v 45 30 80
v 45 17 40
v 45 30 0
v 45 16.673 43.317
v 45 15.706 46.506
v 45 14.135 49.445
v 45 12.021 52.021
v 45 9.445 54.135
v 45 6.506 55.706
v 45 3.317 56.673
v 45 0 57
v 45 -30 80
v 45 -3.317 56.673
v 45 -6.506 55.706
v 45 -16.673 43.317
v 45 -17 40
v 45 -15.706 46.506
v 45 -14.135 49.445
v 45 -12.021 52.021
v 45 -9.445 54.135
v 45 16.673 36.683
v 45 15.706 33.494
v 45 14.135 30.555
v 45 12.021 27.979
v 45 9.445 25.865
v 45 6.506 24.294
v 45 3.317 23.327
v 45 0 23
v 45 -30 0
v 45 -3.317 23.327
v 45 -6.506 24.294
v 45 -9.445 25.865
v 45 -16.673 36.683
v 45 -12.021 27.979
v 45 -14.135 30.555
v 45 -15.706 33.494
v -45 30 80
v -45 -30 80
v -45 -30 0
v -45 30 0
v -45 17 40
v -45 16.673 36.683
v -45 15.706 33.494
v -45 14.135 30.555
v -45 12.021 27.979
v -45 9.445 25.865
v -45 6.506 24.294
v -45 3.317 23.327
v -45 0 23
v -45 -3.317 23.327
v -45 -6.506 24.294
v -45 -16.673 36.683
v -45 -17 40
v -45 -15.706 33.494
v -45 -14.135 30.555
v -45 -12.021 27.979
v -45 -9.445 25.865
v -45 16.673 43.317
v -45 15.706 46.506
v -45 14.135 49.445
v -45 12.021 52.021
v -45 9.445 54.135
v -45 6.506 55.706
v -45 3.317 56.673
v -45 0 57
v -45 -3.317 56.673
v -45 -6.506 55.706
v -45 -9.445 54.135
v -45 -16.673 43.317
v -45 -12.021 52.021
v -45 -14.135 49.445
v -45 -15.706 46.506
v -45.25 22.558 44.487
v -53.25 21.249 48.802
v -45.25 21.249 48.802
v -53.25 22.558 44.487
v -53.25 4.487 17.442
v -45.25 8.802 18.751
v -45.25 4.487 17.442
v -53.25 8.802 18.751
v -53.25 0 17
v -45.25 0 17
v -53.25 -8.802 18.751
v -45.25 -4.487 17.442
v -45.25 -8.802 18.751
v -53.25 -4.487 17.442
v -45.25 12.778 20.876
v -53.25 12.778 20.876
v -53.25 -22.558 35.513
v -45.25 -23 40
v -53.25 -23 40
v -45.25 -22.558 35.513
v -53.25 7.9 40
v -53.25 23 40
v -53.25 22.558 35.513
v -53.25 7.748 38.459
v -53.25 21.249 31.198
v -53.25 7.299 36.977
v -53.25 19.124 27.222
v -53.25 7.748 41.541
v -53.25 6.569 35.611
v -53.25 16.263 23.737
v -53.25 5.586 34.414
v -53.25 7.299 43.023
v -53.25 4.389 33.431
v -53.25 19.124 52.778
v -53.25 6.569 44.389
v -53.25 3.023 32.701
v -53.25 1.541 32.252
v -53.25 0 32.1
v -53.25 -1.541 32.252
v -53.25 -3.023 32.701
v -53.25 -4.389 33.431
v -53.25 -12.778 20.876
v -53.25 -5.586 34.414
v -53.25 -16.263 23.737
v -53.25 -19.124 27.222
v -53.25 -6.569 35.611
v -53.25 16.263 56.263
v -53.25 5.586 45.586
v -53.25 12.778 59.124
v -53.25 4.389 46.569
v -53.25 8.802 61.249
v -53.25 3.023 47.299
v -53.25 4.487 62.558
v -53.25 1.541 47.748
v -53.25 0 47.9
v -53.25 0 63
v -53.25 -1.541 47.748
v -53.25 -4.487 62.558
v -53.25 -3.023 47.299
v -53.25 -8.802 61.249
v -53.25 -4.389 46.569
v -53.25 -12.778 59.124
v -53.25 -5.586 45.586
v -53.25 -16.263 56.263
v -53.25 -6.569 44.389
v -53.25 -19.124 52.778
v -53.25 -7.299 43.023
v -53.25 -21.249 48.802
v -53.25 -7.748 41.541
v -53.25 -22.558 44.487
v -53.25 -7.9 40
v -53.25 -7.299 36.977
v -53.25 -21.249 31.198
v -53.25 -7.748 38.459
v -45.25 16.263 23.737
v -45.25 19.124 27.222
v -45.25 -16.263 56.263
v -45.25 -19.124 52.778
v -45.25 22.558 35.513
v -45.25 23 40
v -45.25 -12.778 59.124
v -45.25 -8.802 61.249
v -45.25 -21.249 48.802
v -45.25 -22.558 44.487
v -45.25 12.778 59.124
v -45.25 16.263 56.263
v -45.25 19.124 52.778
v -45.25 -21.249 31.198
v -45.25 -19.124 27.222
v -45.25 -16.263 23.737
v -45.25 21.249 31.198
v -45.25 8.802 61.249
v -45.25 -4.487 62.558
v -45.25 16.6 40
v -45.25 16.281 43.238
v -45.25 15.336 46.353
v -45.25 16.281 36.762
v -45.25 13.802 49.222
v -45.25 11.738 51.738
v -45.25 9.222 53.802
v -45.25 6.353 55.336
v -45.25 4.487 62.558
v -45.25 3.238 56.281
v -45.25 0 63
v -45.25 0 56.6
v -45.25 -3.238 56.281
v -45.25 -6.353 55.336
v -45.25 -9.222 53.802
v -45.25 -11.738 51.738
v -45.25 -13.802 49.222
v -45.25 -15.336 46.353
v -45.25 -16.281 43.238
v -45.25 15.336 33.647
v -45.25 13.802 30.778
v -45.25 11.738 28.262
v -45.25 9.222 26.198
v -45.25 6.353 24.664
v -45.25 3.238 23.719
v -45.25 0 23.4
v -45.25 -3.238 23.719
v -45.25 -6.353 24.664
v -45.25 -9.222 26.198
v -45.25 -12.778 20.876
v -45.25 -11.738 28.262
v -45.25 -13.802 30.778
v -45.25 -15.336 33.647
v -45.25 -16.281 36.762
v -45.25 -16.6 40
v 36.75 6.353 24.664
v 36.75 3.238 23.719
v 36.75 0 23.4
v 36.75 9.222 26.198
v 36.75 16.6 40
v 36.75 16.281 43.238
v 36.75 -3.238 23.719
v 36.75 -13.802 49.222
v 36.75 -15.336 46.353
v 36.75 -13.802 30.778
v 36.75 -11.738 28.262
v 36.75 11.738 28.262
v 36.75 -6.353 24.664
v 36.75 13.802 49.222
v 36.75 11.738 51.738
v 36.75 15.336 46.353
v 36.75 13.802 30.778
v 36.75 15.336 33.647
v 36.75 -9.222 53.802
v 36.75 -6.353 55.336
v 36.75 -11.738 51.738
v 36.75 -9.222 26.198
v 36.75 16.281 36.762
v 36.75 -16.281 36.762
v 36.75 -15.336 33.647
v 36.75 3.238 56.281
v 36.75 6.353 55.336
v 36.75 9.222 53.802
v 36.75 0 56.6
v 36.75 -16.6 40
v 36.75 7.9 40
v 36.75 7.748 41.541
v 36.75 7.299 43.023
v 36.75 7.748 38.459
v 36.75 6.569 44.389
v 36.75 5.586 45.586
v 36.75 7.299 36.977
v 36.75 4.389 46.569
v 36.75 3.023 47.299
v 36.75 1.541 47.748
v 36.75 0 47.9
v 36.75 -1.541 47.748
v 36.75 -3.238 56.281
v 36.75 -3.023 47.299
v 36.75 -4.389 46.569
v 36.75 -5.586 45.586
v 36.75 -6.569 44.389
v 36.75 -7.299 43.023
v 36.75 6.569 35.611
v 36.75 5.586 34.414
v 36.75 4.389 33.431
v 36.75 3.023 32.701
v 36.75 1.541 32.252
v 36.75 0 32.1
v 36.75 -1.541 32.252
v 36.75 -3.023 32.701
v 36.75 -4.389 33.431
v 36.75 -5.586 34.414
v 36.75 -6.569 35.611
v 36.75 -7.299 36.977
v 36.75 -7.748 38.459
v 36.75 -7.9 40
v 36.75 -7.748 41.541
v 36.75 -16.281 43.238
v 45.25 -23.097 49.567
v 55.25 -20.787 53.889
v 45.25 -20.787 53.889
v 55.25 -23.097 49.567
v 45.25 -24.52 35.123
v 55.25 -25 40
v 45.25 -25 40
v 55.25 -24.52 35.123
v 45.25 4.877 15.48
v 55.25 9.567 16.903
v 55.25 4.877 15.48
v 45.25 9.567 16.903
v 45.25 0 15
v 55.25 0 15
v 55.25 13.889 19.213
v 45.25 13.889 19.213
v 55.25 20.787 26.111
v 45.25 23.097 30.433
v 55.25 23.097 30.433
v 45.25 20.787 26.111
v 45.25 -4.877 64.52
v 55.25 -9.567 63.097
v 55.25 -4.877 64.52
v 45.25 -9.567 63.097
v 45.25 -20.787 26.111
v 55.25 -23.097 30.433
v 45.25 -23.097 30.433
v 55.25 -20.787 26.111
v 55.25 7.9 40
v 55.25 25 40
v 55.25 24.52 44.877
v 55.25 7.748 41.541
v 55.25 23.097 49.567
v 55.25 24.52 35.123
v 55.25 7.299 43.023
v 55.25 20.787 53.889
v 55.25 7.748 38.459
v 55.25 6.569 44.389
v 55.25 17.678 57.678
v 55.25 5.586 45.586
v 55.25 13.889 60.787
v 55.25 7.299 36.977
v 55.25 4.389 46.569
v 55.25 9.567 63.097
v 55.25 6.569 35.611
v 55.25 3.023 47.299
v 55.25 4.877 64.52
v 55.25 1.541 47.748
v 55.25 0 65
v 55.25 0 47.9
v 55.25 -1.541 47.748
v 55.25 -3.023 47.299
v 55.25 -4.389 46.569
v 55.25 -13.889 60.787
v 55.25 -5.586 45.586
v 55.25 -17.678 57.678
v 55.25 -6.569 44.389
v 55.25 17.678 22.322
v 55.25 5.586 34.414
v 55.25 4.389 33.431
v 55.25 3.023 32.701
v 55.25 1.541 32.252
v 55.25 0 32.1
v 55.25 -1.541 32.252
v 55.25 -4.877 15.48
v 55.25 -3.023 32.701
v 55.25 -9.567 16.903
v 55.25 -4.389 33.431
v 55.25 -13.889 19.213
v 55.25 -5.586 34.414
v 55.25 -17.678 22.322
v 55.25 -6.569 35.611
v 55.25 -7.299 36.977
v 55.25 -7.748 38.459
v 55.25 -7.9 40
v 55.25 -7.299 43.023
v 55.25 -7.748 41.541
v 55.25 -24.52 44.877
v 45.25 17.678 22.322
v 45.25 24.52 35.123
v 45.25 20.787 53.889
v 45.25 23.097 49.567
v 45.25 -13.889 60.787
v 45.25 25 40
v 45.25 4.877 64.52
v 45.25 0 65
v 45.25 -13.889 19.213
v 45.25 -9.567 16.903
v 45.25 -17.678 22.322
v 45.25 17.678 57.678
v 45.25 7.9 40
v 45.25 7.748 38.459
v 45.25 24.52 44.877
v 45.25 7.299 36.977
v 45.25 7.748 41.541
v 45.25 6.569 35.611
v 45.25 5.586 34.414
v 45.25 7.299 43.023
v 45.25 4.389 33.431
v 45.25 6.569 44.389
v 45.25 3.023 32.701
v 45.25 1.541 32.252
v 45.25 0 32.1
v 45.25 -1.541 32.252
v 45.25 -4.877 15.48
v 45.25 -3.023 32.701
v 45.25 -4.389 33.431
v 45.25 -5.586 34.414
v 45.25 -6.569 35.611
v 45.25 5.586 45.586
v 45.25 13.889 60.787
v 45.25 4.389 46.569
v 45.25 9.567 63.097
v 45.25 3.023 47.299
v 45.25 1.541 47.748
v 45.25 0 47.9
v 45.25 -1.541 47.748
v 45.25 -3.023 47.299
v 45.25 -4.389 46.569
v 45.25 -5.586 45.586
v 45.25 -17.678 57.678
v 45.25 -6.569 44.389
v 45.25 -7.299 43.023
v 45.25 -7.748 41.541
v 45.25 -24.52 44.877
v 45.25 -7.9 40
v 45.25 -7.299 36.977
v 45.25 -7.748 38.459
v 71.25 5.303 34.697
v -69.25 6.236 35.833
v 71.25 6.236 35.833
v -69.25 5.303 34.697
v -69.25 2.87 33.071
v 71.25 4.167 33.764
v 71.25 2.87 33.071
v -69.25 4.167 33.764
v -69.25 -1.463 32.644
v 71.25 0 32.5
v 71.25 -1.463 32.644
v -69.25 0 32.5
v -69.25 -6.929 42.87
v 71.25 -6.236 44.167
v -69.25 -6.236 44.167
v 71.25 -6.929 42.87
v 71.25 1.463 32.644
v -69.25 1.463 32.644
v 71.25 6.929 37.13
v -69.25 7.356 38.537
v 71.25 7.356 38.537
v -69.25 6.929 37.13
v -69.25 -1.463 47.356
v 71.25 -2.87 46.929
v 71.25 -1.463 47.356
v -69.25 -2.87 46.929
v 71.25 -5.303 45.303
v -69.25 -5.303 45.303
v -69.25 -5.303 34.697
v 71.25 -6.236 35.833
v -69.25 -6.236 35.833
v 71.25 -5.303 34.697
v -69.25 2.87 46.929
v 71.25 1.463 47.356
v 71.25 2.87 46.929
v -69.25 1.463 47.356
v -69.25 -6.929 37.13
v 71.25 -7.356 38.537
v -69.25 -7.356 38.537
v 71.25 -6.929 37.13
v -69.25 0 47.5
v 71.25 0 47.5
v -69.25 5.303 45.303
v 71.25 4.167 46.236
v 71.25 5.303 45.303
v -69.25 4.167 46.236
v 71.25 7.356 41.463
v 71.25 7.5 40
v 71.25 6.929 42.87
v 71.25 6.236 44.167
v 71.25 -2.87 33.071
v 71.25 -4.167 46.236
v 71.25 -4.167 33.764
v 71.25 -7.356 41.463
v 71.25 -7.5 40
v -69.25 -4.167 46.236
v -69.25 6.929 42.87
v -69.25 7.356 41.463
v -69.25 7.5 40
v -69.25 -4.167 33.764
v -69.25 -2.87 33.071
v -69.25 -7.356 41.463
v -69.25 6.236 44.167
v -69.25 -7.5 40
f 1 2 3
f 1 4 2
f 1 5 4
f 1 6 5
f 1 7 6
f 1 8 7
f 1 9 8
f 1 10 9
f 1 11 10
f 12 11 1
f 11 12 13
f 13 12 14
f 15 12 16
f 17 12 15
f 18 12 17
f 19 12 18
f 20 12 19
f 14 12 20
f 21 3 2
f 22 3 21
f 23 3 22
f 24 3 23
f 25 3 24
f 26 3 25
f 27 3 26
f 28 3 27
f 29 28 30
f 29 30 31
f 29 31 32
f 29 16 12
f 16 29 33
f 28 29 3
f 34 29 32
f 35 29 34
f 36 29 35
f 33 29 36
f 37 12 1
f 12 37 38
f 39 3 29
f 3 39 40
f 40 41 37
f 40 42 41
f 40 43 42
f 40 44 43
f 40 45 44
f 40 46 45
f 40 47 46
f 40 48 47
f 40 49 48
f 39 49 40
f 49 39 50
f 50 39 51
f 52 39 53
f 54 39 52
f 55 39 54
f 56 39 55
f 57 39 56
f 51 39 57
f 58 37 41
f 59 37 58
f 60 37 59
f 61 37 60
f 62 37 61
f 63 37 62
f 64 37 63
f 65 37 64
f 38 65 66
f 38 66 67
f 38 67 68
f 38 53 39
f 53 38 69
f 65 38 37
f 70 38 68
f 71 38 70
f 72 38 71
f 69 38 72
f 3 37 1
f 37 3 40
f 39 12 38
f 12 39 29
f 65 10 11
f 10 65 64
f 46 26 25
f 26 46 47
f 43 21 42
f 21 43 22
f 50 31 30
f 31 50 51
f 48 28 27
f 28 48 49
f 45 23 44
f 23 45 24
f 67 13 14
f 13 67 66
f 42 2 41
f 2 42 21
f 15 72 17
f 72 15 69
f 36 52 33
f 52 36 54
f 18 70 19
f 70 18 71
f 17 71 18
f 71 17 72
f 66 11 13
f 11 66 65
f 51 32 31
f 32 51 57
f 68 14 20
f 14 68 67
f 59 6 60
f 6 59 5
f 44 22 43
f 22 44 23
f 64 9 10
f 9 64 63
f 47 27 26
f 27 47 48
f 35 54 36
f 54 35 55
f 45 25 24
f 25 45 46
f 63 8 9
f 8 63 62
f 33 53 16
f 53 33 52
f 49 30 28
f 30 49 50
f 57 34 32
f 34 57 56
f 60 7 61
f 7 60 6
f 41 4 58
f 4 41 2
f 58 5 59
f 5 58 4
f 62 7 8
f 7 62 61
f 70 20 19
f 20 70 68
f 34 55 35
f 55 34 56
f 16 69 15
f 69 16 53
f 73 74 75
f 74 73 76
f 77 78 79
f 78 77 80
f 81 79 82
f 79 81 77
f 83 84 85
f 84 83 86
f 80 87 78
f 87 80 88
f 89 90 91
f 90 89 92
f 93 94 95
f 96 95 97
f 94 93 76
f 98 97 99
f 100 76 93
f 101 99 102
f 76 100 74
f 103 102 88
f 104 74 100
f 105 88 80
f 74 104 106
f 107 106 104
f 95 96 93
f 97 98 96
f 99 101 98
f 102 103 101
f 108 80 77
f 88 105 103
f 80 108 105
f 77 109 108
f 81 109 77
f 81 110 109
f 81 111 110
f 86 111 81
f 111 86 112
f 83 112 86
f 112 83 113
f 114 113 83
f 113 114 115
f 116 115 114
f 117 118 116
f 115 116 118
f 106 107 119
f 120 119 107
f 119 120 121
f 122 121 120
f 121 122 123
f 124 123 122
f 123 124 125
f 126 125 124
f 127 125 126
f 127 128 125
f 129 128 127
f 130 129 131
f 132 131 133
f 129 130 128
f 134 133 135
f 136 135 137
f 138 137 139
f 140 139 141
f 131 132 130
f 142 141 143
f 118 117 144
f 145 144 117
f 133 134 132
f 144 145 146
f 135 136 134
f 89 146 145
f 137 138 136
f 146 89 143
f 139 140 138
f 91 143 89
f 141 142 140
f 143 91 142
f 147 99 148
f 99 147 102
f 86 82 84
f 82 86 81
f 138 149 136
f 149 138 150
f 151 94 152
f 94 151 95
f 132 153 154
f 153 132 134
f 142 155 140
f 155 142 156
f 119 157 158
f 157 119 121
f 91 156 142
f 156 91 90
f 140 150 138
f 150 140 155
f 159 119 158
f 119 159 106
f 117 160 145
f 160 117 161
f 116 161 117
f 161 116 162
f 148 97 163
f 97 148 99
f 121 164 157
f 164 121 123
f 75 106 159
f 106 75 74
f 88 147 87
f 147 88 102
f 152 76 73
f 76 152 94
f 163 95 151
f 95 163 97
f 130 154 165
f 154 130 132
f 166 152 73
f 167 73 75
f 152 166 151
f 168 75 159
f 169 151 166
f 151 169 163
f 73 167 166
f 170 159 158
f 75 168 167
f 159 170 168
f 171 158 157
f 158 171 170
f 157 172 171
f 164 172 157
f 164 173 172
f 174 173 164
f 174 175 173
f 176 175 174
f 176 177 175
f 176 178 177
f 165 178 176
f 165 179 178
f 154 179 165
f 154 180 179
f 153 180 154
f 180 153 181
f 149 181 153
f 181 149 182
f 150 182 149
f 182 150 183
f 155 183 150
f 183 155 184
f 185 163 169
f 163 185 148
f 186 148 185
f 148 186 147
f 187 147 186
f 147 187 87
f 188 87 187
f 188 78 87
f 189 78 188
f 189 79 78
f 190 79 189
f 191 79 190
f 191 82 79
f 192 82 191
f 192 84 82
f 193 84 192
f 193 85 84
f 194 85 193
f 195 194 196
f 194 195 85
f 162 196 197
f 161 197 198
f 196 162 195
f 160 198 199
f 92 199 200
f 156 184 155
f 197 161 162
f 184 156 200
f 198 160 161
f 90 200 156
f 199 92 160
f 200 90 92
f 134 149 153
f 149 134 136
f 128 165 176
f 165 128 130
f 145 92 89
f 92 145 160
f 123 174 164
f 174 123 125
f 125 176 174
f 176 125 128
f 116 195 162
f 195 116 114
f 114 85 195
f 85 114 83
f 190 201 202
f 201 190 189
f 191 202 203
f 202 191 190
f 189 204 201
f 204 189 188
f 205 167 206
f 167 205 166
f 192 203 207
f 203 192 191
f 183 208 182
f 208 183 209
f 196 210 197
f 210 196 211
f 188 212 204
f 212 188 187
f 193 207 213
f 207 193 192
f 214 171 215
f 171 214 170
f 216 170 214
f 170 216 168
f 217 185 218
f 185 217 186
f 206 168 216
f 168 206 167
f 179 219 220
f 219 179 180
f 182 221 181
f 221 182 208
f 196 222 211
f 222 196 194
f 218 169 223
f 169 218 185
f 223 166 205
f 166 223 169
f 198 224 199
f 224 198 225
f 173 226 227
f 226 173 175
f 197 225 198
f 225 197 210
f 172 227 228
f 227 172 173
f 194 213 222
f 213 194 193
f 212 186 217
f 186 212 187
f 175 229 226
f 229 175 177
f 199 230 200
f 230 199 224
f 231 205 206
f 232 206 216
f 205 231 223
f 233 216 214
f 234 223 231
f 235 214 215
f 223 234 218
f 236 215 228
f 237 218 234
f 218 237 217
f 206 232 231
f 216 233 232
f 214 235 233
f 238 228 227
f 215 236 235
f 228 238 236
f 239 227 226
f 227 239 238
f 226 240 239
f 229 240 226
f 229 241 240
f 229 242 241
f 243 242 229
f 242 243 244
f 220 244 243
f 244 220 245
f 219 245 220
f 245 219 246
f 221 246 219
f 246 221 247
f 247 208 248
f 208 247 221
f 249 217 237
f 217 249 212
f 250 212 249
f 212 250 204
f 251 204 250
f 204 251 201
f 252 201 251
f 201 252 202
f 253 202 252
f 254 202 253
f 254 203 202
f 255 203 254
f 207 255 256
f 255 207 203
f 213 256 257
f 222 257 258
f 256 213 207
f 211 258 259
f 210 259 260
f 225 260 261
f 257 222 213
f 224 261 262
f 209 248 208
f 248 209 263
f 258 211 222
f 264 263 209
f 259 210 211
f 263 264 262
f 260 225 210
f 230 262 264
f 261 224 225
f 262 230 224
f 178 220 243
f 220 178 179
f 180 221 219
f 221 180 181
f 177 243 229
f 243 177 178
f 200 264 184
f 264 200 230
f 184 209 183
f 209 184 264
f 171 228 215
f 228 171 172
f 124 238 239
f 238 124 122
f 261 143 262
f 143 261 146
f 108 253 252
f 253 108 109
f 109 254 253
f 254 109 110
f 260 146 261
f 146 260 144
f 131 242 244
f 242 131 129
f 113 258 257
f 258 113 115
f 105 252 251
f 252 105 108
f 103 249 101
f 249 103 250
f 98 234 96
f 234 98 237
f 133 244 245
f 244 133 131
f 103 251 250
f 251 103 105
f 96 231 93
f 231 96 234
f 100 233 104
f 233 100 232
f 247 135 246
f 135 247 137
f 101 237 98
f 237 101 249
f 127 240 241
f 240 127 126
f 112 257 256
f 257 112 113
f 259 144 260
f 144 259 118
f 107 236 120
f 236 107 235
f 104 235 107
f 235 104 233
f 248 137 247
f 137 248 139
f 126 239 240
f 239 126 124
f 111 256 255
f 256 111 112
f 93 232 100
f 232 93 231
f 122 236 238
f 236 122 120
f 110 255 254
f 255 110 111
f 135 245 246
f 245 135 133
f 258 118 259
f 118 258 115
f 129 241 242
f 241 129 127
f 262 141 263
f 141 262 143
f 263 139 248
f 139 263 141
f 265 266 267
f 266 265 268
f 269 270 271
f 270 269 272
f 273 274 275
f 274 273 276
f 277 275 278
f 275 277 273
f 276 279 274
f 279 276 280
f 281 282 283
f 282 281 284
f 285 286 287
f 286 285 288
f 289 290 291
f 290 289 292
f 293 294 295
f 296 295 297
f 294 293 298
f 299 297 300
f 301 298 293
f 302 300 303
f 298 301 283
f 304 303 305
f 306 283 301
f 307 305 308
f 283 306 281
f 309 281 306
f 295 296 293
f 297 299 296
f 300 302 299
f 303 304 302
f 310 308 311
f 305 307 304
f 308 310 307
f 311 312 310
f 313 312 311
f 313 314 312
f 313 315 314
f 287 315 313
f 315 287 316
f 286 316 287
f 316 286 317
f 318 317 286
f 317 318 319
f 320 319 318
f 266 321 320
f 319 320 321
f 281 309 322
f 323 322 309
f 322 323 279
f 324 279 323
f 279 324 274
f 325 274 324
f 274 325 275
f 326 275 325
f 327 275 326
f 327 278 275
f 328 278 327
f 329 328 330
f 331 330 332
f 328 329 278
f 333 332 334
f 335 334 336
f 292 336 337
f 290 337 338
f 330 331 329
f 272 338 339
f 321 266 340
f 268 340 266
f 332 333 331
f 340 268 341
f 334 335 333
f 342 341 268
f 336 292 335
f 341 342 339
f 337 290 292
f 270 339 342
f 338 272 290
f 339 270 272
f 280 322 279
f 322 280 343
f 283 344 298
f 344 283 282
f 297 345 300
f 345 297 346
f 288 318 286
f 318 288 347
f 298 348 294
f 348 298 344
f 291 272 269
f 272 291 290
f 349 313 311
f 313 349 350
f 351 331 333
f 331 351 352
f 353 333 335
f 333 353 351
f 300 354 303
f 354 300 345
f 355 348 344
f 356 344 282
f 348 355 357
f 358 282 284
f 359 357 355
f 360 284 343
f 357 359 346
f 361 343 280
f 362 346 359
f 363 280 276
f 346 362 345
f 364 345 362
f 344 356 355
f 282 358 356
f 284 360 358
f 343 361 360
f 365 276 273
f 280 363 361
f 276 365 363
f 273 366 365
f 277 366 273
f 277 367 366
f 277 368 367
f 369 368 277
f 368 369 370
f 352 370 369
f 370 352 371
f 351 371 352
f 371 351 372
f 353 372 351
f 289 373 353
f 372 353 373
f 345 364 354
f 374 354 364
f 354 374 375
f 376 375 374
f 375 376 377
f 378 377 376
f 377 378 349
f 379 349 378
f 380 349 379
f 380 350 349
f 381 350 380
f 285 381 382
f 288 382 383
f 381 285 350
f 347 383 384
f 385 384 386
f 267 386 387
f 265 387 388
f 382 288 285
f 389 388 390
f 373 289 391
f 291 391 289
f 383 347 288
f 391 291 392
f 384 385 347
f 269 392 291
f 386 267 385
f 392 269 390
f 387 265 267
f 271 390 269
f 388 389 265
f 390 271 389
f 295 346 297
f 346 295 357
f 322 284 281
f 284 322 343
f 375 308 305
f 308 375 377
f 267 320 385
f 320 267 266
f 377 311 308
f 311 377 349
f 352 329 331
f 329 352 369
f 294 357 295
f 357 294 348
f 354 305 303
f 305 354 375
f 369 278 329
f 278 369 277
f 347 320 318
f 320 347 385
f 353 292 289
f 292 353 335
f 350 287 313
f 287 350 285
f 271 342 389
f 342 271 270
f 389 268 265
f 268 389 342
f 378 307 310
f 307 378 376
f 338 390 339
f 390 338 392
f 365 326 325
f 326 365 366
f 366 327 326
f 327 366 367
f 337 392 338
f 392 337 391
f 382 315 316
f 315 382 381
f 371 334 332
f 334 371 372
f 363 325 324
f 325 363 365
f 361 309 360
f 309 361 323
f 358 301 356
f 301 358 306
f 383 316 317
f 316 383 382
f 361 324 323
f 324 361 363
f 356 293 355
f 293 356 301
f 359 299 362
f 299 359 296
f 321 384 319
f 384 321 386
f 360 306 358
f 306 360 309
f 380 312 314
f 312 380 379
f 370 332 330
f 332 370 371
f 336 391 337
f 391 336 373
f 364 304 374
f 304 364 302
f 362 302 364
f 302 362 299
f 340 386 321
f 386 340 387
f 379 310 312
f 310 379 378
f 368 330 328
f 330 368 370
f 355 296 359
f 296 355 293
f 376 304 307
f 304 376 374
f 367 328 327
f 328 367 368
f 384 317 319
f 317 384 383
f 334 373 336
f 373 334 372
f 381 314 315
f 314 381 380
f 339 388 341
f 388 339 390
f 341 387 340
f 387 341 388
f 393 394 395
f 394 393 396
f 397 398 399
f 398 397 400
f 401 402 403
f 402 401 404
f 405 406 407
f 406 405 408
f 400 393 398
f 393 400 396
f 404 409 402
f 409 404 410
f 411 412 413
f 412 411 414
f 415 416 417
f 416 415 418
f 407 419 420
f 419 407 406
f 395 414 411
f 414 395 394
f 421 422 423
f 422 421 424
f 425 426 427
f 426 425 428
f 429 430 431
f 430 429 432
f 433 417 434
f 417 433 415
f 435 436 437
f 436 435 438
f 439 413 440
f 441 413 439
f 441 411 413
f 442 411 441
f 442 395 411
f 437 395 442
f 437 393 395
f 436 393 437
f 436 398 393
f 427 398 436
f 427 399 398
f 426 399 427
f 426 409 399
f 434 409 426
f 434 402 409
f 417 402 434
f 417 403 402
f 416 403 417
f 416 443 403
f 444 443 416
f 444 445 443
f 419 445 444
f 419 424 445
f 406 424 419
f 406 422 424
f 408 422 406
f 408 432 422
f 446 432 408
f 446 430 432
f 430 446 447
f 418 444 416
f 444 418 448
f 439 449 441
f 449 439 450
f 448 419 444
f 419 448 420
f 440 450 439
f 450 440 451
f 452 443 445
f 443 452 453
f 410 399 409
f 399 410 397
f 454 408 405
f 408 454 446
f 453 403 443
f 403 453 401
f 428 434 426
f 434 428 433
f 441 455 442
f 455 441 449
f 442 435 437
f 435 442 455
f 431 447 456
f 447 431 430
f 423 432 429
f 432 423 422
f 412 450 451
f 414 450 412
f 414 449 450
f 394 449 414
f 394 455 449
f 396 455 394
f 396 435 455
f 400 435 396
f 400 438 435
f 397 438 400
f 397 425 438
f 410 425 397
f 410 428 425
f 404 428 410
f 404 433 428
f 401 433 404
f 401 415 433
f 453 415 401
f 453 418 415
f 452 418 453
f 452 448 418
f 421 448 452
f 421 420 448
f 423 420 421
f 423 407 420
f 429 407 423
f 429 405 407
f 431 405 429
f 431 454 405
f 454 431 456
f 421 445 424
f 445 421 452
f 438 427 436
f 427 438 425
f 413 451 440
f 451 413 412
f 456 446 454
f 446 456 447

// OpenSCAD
$fn = 32;

// ------------------------------------------------------------------------
// Bushed housing: 90 x 60 x 80 mm housing, bushing d33.2
// Every part is its own module, assembly() places them once.
// ------------------------------------------------------------------------

// --- part 1 ---
module housing() {
  difference() {
    translate([-45, -30, 0]) cube([90, 60, 80]);
    translate([0, 0, 40]) rotate([0, 90, 0]) cylinder(h = 92, d = 34, center = true);
  }
}

// --- part 2 ---
module bushing() {
  difference() {
    union() {
      cylinder(h = 8, d = 46);
      translate([0, 0, 8]) cylinder(h = 82, d = 33.2);
    }
    translate([0, 0, -1]) cylinder(h = 92, d = 15.8);
  }
}

// --- part 3 ---
module shaft() {
  translate([0, 0, -70.25]) cylinder(h = 140.5, d = 15);
}

// --- part 4 ---
module cover() {
  difference() {
    cylinder(h = 10, d = 50);
    translate([0, 0, -1]) cylinder(h = 12, d = 15.8);
  }
}

// --- assembly ---
module assembly() {
  translate([0, 0, 0]) rotate([0, 0, 0]) housing();
  translate([-53.25, 0, 40]) rotate([0, 90, 0]) bushing();
  translate([1, 0, 40]) rotate([0, 90, 0]) shaft();
  translate([45.25, 0, 40]) rotate([0, 90, 0]) cover();
}

assembly();
